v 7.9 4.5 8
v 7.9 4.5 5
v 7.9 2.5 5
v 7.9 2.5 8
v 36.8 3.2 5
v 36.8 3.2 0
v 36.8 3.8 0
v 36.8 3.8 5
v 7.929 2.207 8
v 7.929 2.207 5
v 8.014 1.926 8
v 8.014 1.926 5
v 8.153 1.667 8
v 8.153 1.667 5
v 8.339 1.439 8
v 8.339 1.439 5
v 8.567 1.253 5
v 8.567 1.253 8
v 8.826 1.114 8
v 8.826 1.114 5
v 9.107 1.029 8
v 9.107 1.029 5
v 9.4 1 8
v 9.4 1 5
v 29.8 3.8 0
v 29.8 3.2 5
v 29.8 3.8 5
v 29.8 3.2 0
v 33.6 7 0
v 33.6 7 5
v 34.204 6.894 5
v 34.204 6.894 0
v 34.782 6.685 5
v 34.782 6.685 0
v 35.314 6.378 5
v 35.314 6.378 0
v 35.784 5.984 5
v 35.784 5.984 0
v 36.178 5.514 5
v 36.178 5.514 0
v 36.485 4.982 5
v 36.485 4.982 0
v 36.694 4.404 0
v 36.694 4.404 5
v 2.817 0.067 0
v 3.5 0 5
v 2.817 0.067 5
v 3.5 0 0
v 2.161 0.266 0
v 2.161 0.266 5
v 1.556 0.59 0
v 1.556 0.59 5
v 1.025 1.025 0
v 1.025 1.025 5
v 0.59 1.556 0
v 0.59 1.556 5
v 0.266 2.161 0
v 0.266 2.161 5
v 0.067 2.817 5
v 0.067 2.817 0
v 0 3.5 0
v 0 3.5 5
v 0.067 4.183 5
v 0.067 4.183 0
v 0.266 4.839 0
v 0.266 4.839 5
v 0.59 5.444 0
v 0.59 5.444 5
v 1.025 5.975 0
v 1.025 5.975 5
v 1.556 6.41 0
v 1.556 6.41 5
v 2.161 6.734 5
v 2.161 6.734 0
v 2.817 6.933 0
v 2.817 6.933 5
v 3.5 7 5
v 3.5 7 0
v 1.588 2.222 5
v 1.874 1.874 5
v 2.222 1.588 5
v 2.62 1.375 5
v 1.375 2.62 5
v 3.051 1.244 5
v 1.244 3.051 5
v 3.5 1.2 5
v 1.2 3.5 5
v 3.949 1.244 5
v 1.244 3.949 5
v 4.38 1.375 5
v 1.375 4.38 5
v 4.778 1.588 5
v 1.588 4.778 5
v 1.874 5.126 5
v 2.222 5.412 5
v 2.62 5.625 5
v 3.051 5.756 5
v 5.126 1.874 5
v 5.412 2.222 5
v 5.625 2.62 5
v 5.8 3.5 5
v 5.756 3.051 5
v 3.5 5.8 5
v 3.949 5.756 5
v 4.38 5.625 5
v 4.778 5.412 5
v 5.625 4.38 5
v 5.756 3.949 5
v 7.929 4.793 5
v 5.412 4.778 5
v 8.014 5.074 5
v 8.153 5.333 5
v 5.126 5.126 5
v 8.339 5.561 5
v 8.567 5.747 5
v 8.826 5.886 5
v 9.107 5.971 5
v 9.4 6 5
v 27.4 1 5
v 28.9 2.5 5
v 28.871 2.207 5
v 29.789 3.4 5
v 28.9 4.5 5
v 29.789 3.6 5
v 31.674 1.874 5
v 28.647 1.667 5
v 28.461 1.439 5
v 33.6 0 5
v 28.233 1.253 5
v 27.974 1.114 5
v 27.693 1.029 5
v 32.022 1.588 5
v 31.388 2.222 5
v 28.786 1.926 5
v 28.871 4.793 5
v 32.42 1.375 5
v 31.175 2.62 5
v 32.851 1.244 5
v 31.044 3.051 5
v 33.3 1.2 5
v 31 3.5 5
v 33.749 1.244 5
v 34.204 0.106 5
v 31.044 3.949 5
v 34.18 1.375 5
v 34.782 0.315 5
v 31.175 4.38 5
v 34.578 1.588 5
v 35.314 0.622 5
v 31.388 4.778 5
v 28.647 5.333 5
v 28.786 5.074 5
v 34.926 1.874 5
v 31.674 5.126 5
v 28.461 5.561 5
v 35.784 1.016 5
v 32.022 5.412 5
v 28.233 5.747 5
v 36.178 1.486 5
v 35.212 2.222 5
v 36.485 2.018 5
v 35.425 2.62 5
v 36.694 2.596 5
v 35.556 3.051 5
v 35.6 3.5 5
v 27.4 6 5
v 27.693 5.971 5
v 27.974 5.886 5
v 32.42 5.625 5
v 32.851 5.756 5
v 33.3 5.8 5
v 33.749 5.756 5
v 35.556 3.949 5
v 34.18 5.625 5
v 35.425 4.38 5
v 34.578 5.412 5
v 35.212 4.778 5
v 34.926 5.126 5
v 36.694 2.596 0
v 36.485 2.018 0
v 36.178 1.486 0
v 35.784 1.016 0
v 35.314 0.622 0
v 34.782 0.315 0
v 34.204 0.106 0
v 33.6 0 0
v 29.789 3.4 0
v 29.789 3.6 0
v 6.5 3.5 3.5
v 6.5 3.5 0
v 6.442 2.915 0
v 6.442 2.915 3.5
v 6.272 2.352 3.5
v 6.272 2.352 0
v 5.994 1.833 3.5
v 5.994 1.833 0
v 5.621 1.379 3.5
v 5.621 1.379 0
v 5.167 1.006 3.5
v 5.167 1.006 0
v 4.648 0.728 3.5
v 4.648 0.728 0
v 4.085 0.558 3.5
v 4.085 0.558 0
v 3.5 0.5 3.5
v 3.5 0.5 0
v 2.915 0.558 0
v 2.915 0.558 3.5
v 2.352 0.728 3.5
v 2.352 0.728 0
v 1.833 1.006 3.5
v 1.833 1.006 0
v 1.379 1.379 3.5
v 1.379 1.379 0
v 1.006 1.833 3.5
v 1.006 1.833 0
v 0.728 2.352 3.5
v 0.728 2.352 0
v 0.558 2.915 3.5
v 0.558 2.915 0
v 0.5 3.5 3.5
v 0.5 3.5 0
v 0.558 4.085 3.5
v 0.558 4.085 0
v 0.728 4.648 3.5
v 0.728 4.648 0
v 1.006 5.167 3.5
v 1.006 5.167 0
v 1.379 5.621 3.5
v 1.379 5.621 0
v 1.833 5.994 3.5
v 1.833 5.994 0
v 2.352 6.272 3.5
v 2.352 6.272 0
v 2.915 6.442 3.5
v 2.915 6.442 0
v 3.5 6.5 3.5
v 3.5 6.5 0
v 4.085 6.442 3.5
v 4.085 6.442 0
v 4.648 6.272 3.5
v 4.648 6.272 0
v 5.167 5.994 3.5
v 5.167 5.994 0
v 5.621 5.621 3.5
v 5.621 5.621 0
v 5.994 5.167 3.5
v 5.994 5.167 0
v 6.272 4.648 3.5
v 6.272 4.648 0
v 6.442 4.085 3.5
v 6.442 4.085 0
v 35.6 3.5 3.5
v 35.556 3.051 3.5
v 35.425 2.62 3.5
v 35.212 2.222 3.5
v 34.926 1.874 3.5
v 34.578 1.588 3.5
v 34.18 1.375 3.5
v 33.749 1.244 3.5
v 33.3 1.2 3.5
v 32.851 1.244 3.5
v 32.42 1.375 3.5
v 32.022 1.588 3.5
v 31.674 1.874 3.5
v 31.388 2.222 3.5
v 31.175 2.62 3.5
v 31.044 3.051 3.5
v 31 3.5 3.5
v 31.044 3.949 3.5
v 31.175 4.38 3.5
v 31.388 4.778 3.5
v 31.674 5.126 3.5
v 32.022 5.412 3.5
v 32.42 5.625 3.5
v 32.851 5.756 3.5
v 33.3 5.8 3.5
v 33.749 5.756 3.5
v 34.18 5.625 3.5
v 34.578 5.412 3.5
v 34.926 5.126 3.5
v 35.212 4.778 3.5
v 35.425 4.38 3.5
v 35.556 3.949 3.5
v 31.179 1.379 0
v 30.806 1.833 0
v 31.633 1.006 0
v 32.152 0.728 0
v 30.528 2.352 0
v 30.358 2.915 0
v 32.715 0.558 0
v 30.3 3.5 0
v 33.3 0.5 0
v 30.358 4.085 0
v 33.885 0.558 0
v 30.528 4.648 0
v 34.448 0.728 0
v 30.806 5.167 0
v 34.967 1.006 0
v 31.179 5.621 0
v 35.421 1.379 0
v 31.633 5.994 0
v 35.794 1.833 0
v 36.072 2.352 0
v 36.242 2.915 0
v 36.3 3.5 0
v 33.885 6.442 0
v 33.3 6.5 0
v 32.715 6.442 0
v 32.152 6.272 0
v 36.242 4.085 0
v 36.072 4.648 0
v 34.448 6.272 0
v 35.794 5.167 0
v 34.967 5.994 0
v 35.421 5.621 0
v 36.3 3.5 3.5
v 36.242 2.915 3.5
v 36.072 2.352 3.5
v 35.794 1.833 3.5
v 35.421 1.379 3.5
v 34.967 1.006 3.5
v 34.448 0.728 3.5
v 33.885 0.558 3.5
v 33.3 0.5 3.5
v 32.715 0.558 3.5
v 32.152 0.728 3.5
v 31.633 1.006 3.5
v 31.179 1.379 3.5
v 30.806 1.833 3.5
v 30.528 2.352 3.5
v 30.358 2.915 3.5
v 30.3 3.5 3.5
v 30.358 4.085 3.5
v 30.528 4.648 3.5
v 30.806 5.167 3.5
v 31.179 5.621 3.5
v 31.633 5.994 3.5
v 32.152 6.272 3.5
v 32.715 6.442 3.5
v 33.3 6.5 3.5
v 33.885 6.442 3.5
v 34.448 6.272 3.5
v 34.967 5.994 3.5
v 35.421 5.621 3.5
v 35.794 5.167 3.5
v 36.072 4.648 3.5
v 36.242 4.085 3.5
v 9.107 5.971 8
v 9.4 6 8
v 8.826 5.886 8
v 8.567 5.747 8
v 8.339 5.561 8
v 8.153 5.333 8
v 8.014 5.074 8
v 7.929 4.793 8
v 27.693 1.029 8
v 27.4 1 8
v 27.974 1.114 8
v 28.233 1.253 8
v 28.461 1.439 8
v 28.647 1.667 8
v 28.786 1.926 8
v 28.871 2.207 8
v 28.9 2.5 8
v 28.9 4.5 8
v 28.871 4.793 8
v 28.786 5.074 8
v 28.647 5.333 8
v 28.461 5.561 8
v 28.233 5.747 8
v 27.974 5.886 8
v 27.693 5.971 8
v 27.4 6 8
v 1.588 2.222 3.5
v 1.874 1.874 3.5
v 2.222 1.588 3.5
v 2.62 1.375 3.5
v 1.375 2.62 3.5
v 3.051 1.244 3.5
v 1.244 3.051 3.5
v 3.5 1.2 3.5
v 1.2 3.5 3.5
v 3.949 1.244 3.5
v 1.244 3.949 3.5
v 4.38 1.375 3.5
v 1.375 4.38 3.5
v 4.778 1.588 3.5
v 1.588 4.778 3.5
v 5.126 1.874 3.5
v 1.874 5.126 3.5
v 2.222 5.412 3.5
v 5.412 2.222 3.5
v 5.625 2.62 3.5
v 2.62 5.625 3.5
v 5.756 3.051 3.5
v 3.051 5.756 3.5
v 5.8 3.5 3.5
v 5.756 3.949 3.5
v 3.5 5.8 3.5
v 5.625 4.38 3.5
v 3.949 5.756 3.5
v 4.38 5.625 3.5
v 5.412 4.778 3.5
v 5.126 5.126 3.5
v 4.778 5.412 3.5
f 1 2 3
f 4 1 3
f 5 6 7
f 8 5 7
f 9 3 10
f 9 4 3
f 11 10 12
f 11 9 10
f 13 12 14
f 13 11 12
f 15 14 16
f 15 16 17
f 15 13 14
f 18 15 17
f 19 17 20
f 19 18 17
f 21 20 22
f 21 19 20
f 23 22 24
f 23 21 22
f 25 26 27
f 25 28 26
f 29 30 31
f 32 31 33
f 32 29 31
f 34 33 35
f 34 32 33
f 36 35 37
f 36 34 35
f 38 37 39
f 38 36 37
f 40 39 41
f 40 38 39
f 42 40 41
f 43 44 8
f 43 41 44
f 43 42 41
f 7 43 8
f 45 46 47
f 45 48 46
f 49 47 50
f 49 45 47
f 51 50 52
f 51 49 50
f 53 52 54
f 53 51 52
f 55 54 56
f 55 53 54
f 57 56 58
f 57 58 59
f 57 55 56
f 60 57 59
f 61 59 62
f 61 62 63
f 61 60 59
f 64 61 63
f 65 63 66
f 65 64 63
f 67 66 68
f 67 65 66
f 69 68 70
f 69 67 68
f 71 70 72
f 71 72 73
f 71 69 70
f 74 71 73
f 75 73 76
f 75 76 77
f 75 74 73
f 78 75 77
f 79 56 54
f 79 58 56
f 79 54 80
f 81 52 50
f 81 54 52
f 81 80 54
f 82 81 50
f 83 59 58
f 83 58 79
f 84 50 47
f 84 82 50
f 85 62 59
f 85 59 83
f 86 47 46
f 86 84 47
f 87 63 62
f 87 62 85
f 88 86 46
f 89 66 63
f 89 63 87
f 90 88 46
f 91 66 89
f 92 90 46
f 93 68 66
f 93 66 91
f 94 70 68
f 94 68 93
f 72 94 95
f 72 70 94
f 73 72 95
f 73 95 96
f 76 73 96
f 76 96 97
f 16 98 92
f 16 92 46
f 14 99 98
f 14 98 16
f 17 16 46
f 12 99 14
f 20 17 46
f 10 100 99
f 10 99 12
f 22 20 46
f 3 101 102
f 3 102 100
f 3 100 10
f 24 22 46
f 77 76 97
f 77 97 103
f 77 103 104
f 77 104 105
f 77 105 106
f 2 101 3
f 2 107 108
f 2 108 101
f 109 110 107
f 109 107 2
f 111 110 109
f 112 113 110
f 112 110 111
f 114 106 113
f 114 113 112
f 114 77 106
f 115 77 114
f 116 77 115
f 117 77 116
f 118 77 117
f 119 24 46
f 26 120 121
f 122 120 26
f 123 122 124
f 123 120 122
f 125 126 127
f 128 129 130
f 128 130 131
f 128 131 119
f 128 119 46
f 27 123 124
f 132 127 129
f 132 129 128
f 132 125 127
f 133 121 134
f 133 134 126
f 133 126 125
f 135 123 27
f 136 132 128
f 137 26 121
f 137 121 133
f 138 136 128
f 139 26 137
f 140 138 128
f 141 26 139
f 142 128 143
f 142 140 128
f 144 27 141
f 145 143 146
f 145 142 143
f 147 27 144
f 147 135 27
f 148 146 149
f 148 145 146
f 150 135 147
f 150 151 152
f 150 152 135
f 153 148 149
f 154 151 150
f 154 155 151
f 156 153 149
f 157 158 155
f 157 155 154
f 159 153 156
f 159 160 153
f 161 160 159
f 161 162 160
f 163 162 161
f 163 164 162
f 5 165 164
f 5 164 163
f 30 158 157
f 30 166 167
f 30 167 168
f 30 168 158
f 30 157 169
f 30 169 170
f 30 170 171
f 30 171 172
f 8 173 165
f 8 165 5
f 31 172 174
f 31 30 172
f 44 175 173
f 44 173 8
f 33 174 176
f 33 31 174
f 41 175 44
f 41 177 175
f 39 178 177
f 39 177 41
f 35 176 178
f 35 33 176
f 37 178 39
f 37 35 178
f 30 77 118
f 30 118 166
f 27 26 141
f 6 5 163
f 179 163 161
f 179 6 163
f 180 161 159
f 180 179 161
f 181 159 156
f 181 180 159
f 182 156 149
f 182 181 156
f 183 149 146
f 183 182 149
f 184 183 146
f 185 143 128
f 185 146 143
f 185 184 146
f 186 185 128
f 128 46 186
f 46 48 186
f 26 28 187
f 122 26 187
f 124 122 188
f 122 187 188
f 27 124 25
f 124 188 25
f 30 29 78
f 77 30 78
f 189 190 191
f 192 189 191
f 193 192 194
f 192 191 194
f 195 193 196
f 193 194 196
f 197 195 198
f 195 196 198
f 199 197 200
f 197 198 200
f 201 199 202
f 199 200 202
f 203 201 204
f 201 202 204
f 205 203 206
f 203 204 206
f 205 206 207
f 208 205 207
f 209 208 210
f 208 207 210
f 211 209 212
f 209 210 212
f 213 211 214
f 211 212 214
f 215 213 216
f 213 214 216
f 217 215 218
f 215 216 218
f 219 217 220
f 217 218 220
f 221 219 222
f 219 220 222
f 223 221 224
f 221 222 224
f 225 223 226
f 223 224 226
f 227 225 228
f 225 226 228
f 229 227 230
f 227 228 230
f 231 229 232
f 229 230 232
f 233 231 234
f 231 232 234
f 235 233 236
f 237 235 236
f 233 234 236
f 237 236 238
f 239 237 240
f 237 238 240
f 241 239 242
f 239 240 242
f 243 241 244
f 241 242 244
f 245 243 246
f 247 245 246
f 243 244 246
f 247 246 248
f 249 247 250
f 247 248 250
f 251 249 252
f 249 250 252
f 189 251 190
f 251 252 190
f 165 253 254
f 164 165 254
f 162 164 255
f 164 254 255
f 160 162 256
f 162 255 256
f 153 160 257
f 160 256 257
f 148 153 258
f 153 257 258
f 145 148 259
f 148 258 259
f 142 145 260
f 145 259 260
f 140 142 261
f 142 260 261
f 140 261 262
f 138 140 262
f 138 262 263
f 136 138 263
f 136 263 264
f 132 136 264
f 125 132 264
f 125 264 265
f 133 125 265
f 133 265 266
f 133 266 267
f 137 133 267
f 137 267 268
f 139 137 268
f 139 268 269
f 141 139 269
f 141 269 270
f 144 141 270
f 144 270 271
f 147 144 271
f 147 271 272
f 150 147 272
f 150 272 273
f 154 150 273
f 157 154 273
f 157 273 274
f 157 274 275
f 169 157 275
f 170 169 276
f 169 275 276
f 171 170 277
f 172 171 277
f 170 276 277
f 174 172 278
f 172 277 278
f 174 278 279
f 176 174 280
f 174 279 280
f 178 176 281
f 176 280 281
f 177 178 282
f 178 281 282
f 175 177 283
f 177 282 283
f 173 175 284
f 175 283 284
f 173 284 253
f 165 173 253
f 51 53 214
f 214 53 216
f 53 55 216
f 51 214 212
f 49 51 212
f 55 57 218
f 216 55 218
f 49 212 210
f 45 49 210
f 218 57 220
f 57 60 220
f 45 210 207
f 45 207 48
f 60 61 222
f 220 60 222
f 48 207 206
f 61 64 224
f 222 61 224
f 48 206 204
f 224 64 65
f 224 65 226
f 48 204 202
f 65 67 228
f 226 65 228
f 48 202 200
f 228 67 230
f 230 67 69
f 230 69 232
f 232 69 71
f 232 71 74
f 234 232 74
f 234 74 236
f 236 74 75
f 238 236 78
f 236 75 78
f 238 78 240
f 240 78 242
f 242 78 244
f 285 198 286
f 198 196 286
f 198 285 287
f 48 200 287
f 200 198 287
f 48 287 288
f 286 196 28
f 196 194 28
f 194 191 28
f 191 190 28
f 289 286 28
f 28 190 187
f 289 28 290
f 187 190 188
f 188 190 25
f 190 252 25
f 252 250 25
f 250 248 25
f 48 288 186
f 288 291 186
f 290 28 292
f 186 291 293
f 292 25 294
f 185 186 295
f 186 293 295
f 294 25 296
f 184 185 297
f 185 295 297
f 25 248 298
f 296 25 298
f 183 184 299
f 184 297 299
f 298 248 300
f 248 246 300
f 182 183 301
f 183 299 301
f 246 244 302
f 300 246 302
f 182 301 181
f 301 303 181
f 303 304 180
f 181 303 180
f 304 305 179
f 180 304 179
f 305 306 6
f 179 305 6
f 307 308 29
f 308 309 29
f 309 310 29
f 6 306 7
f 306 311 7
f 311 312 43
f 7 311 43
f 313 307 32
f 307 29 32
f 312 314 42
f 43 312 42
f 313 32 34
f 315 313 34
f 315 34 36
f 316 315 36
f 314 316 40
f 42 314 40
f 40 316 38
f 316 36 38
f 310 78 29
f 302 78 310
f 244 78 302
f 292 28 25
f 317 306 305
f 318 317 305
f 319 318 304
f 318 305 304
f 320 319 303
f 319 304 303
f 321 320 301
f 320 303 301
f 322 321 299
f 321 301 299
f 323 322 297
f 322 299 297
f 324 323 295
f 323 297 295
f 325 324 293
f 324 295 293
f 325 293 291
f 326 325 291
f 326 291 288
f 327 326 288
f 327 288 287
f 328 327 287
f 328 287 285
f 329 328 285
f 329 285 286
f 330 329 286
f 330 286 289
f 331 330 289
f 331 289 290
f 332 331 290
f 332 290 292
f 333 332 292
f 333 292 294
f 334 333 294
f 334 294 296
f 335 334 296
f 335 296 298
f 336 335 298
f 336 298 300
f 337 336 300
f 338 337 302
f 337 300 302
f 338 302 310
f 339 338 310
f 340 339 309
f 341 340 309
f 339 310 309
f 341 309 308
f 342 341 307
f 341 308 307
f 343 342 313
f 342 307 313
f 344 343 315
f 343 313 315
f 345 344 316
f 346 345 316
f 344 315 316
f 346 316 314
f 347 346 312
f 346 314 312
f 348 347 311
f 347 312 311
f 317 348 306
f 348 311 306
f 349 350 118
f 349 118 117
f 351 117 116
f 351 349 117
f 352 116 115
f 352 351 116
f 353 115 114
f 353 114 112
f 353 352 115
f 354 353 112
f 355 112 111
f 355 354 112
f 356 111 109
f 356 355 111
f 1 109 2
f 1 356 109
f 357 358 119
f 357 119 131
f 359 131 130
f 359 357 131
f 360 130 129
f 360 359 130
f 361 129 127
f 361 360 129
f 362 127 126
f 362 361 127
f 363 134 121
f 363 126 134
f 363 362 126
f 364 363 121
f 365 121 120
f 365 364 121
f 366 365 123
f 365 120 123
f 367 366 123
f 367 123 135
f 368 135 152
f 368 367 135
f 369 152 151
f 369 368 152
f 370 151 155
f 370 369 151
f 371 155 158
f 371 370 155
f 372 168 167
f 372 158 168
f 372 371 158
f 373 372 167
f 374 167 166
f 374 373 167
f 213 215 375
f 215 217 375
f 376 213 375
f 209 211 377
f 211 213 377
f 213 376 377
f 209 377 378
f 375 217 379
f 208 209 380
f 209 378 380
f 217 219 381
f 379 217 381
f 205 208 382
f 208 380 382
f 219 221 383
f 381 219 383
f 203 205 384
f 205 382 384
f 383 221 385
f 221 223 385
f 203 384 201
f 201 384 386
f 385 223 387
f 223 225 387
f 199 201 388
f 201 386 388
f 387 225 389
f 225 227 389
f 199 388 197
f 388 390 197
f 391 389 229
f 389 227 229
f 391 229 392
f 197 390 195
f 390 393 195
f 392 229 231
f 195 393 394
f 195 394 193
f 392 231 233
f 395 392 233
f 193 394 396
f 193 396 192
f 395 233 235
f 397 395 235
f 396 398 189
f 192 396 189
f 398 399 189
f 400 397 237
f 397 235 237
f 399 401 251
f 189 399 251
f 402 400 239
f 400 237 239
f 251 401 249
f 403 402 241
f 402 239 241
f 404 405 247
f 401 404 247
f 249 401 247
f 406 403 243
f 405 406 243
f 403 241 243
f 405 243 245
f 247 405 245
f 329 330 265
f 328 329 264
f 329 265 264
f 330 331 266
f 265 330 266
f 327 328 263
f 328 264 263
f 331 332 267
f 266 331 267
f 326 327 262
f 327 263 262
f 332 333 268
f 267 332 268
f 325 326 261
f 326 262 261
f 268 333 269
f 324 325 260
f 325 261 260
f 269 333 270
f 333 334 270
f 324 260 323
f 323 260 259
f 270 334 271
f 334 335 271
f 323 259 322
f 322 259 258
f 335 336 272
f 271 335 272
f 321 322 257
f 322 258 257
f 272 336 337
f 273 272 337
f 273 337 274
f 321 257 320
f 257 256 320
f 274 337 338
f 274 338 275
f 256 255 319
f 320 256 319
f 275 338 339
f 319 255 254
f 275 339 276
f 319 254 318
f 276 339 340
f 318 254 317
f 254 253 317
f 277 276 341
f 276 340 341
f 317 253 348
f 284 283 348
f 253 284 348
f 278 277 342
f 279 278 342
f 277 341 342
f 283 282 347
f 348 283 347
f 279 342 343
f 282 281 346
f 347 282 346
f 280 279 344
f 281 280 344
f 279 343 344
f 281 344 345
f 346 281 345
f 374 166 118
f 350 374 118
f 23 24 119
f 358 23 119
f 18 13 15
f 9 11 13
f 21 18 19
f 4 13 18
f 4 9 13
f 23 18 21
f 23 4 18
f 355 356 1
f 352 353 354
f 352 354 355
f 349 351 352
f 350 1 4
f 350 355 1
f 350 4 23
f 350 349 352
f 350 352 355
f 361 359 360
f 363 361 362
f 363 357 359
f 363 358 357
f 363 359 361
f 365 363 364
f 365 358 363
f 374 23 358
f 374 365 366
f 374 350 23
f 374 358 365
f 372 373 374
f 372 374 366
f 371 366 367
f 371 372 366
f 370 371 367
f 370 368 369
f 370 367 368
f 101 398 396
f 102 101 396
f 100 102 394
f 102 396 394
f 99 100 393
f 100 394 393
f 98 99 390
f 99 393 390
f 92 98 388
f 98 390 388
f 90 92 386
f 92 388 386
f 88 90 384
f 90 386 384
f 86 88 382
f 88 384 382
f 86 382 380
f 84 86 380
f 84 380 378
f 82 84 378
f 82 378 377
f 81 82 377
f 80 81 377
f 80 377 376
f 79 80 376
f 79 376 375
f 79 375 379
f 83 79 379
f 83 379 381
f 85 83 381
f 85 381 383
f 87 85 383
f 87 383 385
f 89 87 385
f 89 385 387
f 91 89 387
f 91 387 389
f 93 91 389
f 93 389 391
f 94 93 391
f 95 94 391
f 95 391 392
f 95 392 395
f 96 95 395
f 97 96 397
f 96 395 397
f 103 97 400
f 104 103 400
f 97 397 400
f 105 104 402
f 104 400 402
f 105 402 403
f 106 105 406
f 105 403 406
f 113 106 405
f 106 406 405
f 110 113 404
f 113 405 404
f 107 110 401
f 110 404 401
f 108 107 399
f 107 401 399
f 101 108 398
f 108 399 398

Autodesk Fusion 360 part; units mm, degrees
sketch "Sketch1" plane through (0, 0, 0) normal (0, 0, 1) x (1, 0, 0)
  line L0 (0, 0) -> (7, 0)
  line L1 (7, 0) -> (7, 7)
  line L2 (7, 7) -> (0, 7)
  line L3 (0, 7) -> (0, 0)
  line L4 (7, 0) -> (29.8, 0)
  line L5 (29.8, 0) -> (29.8, 7)
  line L6 (29.8, 7) -> (7, 7)
  line L7 (7, 7) -> (7, 0)
  line L8 (29.8, 0) -> (36.8, 0)
  line L9 (36.8, 0) -> (36.8, 7)
  line L10 (36.8, 7) -> (29.8, 7)
  line L11 (29.8, 7) -> (29.8, 0)
  line L12 (0, 7) -> (7, 0)
  line L13 (0, 0) -> (7, 7)
  line L14 (29.8, 7) -> (36.8, 0)
  line L15 (29.8, 0) -> (36.8, 7)
  circle A0 centre (3.5, 3.5) radius 2.3
  circle A1 centre (33.3, 3.5) radius 2.3
  circle A2 centre (3.5, 3.5) radius 3.5
  circle A3 centre (33.3, 3.5) radius 3.5128
  circle A4 centre (33.3, 3.5) radius 3
  circle A5 centre (3.5, 3.5) radius 3
  line L16 (29.8, 7) -> (7, 0)
  line L17 (29.8, 0) -> (7, 7)
  line L18 (7.9, 1) -> (28.9, 1)
  line L19 (28.9, 1) -> (28.9, 6)
  line L20 (28.9, 6) -> (7.9, 6)
  line L21 (7.9, 6) -> (7.9, 1)
  line L22 (7.9, 1) -> (28.9, 6) construction
  line L23 (28.9, 1) -> (7.9, 6) construction
  point P0 (18.4, 3.5)
  dimension "d1" = 7
  dimension "d2" = 7
  dimension "d3" = 22.8
  dimension "d4" = 7
  dimension "d5" = 4.6
  dimension "d6" = 4.6
  dimension "d9" = 6
  dimension "d10" = 6
  dimension "d13" = 21
  dimension "d14" = 5
extrude "Extrude1" add sketch "Sketch1" along normal blind 5 contours L0 L12 A2 | L12 L13 A2 A5 | L12 L13 A2 A5 | L1 L7 L12 A2 | L4 L16 L17 L18 | L1 L7 L16 L17 L18 L20 L21 | L12 L13 A2 A5 | L12 L13 A2 A5 | L12 L13 A0 A5 | L12 L13 A0 A5 | L1 L7 L13 A2 | L5 L11 A3 L16 L17 L18 L19 L20 | L8 L15 A3 | L5 L11 L15 A3 | L16 L17 L18 L20 L21 | L16 L17 L18 | L12 L13 A0 A5 | L2 L13 A2 | L12 L13 A0 A5 | L6 L16 L17 L20 | L5 L11 L14 L15 A3 A4 | L8 L14 L15 A3 A4 | L16 L17 L18 L19 L20 | L16 L17 L20 | L5 L11 L14 A3 | L10 L14 A3 | L14 L15 A1 A4 | L14 L15 A1 A4 | L10 L14 L15 A3 A4 | L9 L14 L15 A3 A4 | L14 L15 A1 A4 | L14 L15 A1 A4
extrude "Extrude2" cut sketch "Sketch1" along normal blind 3.5 contours L12 L13 A0 A5 | L12 L13 A0 A5 | L12 L13 A0 A5 | L12 L13 A0 A5 | L14 L15 A1 A4 | L14 L15 A1 A4 | L14 L15 A1 A4 | L14 L15 A1 A4
extrude "Extrude3" add sketch "Sketch1" along normal blind 8 contours L16 L17 L18 L20 L21 | L16 L17 L18 | L16 L17 L18 L19 L20 | L16 L17 L20
fillet "Fillet1" radius 1.5 1 edges at (7.9, 6, 6.5)
fillet "Fillet2" radius 1.5 1 edges at (7.9, 1, 6.5)
fillet "Fillet3" radius 1.5 1 edges at (28.9, 6, 6.5)
fillet "Fillet4" radius 1.5 1 edges at (28.9, 1, 6.5)
